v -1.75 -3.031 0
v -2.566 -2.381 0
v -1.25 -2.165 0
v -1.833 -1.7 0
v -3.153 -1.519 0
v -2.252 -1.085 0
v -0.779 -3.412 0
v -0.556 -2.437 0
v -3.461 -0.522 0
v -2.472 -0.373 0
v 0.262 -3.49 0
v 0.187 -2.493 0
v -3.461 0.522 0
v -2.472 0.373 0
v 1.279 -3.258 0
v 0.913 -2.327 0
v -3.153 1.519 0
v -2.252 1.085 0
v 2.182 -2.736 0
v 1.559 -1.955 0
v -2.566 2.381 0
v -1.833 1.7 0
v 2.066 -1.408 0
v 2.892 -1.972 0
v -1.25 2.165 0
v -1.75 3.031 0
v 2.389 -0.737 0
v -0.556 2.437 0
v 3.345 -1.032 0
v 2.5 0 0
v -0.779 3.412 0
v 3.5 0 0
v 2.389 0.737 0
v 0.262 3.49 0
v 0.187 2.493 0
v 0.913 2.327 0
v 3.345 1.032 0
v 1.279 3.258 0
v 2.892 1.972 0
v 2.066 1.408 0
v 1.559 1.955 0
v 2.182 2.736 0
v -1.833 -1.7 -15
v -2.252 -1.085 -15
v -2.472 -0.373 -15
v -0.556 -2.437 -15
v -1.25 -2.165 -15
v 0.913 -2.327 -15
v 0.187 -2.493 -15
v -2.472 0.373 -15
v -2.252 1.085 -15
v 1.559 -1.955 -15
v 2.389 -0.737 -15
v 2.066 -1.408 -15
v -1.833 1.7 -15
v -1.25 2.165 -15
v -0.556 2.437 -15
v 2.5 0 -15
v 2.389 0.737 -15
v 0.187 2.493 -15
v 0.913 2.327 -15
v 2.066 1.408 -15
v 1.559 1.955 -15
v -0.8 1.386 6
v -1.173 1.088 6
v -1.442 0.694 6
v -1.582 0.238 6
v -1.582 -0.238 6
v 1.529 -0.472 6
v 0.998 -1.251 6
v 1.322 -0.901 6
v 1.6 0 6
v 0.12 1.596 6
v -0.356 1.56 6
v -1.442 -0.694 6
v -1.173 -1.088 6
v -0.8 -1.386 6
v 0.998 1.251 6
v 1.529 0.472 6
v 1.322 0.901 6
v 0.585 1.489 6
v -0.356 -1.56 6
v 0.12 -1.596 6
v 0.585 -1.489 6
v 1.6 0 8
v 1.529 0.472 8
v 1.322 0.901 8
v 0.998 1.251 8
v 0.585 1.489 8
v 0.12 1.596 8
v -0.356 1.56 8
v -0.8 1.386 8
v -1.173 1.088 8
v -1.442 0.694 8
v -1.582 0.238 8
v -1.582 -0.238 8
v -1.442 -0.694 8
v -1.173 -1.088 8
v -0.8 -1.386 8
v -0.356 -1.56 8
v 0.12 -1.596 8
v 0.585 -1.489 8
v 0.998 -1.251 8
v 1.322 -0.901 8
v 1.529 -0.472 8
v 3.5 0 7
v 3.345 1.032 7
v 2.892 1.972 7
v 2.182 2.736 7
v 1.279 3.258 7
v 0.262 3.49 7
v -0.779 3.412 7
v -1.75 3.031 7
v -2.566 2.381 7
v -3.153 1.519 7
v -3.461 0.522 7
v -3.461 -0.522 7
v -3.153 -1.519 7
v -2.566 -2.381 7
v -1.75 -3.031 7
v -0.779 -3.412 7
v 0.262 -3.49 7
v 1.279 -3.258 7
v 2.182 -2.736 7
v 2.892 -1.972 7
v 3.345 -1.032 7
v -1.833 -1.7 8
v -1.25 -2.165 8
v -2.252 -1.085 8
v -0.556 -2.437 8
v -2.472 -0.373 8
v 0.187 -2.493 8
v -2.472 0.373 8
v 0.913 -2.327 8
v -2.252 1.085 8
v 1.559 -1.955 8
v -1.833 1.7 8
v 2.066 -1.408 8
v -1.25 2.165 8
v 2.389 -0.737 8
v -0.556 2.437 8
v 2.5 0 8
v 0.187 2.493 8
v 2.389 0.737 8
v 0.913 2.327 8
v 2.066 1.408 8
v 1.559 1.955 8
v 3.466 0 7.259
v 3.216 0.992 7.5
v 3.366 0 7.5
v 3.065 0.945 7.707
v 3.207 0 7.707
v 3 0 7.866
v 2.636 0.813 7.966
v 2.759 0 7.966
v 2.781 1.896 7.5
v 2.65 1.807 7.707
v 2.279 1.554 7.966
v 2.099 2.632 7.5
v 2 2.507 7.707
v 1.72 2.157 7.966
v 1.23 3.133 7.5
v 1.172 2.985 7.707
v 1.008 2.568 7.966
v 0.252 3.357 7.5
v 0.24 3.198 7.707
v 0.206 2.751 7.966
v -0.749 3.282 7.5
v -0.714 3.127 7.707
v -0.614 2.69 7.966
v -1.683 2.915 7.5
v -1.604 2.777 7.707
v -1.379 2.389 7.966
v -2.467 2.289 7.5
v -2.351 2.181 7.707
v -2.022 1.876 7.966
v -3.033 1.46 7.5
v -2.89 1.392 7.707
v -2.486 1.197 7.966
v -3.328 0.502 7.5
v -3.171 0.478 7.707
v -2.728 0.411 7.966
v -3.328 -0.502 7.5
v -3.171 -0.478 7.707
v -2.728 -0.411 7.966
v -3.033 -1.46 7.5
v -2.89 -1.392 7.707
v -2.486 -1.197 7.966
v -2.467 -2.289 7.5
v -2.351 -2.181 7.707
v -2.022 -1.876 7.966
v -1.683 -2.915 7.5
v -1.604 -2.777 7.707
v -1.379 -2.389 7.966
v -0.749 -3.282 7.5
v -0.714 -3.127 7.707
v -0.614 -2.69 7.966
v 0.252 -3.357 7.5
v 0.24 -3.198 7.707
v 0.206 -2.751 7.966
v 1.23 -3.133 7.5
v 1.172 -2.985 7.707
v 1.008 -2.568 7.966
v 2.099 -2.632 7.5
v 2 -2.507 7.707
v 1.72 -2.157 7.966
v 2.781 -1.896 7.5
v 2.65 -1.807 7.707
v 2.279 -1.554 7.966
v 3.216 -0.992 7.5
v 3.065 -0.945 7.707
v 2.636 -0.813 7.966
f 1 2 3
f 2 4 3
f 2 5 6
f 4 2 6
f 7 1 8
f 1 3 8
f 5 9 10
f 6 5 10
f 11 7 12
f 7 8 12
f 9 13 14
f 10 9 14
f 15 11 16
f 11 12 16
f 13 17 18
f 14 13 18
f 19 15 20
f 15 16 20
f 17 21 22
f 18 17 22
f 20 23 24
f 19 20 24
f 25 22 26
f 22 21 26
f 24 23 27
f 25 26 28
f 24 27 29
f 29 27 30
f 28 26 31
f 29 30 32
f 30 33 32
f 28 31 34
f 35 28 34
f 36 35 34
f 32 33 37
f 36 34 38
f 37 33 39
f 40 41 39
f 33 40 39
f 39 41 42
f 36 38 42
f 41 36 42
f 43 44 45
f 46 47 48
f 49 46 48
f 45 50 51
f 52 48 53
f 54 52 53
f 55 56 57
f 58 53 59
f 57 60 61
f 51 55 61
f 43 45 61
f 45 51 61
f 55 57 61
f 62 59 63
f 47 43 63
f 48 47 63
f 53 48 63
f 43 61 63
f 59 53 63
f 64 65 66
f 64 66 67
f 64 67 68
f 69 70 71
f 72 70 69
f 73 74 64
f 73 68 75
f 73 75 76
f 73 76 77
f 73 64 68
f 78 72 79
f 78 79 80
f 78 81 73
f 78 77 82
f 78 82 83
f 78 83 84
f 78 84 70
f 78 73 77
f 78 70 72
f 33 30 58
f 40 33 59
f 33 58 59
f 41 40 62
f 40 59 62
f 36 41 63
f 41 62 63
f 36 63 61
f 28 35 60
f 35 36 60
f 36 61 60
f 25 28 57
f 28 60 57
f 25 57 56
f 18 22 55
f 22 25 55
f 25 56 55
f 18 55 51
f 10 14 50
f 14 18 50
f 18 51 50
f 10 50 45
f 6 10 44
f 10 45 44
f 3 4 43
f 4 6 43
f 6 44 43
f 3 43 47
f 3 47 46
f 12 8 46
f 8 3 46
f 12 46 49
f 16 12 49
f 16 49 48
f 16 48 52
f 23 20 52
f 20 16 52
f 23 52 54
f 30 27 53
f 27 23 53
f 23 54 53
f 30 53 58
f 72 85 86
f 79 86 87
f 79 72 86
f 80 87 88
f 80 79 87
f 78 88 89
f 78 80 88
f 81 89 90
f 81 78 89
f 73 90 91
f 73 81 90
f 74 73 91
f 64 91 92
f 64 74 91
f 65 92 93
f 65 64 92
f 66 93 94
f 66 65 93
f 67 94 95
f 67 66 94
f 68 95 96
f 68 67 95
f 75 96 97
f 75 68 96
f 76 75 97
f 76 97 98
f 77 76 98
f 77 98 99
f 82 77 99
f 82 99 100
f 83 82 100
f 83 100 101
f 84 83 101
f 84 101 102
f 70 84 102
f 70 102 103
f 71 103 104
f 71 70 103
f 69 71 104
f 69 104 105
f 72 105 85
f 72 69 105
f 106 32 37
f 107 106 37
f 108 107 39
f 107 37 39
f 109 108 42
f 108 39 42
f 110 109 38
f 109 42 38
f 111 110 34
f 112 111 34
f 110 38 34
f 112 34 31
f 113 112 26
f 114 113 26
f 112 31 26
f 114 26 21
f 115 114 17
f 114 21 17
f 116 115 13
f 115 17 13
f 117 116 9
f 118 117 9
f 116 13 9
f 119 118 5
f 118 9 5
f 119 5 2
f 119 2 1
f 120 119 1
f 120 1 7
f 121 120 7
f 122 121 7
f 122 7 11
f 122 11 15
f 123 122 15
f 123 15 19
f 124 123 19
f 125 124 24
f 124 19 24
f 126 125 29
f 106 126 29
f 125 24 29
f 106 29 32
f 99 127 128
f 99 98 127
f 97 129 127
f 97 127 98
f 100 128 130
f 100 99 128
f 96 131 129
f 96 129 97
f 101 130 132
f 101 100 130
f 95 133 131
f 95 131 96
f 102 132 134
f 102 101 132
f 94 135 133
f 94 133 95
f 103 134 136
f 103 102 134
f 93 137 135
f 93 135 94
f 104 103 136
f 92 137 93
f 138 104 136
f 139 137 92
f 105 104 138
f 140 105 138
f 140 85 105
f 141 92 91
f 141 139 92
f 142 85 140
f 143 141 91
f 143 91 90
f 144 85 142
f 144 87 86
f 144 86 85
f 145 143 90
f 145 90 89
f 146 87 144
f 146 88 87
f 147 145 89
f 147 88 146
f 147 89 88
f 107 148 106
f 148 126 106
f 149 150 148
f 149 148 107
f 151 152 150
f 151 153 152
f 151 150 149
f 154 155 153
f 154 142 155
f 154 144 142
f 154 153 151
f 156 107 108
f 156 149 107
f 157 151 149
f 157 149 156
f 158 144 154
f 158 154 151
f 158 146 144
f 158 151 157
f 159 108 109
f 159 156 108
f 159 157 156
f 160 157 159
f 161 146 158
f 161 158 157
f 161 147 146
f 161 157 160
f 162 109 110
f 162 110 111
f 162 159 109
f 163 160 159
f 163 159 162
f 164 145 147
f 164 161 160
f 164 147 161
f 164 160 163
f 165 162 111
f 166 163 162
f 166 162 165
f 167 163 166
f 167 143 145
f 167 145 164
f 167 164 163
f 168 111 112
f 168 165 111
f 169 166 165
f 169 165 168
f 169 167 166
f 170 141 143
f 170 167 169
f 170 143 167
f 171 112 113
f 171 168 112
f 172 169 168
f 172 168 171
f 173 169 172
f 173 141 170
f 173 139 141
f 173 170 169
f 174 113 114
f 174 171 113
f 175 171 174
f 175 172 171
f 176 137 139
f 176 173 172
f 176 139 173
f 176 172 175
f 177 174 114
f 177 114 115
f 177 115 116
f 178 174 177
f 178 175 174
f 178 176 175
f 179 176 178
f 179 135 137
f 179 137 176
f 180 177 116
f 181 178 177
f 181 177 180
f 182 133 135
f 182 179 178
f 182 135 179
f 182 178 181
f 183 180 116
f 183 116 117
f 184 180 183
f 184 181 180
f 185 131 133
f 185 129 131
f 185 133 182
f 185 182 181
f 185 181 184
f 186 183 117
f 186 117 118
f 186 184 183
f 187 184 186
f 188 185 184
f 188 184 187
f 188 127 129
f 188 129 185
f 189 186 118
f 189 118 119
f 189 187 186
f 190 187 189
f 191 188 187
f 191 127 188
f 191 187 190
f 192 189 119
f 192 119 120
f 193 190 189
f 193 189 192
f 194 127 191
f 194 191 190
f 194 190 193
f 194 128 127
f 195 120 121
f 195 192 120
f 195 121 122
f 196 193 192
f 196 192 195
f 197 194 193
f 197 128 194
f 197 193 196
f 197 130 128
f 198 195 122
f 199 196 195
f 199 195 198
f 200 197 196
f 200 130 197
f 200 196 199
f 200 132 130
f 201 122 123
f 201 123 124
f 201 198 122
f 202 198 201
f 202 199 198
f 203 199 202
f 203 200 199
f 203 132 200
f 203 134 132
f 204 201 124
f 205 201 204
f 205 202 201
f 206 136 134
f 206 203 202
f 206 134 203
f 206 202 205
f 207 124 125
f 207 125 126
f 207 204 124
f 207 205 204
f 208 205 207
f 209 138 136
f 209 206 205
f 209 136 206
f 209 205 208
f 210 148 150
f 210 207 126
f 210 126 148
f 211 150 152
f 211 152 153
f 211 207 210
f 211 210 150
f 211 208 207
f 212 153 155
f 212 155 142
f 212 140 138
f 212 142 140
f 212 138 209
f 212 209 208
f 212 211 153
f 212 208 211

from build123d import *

# Parameters (mm, degrees)
CYLINDER001_R     = 1.6
CYLINDER001_DEPTH = 4
CYLINDER002_R     = 2.5
CYLINDER002_DEPTH = 16
CYLINDER_R        = 3.5
CYLINDER_DEPTH    = 8
FILLET_R          = 1


with BuildPart() as hole:
    # Cylinder001 → Cylinder001 (new body)
    with BuildSketch(Plane.XY.offset(6)):
        Circle(CYLINDER001_R)
    extrude(amount=CYLINDER001_DEPTH)


with BuildPart() as thread:
    # Cylinder002 → Cylinder002 (new body)
    with BuildSketch(Plane.XY.offset(-15)):
        Circle(CYLINDER002_R)
    extrude(amount=CYLINDER002_DEPTH)


with BuildPart() as rca_socket:
    # Cylinder → Cylinder (new body)
    with BuildSketch(Plane.XY):
        Circle(CYLINDER_R)
    extrude(amount=CYLINDER_DEPTH)

    # Fusion: union thread
    add(thread.part)

    # Cut: cut hole
    add(hole.part, mode=Mode.SUBTRACT)

    # Fillet
    fillet_edges = [rca_socket.edges().sort_by_distance(p)[0] for p in [
        (-3.5, 0, 8),
    ]]
    fillet(fillet_edges, radius=FILLET_R)


solid = rca_socket.part
